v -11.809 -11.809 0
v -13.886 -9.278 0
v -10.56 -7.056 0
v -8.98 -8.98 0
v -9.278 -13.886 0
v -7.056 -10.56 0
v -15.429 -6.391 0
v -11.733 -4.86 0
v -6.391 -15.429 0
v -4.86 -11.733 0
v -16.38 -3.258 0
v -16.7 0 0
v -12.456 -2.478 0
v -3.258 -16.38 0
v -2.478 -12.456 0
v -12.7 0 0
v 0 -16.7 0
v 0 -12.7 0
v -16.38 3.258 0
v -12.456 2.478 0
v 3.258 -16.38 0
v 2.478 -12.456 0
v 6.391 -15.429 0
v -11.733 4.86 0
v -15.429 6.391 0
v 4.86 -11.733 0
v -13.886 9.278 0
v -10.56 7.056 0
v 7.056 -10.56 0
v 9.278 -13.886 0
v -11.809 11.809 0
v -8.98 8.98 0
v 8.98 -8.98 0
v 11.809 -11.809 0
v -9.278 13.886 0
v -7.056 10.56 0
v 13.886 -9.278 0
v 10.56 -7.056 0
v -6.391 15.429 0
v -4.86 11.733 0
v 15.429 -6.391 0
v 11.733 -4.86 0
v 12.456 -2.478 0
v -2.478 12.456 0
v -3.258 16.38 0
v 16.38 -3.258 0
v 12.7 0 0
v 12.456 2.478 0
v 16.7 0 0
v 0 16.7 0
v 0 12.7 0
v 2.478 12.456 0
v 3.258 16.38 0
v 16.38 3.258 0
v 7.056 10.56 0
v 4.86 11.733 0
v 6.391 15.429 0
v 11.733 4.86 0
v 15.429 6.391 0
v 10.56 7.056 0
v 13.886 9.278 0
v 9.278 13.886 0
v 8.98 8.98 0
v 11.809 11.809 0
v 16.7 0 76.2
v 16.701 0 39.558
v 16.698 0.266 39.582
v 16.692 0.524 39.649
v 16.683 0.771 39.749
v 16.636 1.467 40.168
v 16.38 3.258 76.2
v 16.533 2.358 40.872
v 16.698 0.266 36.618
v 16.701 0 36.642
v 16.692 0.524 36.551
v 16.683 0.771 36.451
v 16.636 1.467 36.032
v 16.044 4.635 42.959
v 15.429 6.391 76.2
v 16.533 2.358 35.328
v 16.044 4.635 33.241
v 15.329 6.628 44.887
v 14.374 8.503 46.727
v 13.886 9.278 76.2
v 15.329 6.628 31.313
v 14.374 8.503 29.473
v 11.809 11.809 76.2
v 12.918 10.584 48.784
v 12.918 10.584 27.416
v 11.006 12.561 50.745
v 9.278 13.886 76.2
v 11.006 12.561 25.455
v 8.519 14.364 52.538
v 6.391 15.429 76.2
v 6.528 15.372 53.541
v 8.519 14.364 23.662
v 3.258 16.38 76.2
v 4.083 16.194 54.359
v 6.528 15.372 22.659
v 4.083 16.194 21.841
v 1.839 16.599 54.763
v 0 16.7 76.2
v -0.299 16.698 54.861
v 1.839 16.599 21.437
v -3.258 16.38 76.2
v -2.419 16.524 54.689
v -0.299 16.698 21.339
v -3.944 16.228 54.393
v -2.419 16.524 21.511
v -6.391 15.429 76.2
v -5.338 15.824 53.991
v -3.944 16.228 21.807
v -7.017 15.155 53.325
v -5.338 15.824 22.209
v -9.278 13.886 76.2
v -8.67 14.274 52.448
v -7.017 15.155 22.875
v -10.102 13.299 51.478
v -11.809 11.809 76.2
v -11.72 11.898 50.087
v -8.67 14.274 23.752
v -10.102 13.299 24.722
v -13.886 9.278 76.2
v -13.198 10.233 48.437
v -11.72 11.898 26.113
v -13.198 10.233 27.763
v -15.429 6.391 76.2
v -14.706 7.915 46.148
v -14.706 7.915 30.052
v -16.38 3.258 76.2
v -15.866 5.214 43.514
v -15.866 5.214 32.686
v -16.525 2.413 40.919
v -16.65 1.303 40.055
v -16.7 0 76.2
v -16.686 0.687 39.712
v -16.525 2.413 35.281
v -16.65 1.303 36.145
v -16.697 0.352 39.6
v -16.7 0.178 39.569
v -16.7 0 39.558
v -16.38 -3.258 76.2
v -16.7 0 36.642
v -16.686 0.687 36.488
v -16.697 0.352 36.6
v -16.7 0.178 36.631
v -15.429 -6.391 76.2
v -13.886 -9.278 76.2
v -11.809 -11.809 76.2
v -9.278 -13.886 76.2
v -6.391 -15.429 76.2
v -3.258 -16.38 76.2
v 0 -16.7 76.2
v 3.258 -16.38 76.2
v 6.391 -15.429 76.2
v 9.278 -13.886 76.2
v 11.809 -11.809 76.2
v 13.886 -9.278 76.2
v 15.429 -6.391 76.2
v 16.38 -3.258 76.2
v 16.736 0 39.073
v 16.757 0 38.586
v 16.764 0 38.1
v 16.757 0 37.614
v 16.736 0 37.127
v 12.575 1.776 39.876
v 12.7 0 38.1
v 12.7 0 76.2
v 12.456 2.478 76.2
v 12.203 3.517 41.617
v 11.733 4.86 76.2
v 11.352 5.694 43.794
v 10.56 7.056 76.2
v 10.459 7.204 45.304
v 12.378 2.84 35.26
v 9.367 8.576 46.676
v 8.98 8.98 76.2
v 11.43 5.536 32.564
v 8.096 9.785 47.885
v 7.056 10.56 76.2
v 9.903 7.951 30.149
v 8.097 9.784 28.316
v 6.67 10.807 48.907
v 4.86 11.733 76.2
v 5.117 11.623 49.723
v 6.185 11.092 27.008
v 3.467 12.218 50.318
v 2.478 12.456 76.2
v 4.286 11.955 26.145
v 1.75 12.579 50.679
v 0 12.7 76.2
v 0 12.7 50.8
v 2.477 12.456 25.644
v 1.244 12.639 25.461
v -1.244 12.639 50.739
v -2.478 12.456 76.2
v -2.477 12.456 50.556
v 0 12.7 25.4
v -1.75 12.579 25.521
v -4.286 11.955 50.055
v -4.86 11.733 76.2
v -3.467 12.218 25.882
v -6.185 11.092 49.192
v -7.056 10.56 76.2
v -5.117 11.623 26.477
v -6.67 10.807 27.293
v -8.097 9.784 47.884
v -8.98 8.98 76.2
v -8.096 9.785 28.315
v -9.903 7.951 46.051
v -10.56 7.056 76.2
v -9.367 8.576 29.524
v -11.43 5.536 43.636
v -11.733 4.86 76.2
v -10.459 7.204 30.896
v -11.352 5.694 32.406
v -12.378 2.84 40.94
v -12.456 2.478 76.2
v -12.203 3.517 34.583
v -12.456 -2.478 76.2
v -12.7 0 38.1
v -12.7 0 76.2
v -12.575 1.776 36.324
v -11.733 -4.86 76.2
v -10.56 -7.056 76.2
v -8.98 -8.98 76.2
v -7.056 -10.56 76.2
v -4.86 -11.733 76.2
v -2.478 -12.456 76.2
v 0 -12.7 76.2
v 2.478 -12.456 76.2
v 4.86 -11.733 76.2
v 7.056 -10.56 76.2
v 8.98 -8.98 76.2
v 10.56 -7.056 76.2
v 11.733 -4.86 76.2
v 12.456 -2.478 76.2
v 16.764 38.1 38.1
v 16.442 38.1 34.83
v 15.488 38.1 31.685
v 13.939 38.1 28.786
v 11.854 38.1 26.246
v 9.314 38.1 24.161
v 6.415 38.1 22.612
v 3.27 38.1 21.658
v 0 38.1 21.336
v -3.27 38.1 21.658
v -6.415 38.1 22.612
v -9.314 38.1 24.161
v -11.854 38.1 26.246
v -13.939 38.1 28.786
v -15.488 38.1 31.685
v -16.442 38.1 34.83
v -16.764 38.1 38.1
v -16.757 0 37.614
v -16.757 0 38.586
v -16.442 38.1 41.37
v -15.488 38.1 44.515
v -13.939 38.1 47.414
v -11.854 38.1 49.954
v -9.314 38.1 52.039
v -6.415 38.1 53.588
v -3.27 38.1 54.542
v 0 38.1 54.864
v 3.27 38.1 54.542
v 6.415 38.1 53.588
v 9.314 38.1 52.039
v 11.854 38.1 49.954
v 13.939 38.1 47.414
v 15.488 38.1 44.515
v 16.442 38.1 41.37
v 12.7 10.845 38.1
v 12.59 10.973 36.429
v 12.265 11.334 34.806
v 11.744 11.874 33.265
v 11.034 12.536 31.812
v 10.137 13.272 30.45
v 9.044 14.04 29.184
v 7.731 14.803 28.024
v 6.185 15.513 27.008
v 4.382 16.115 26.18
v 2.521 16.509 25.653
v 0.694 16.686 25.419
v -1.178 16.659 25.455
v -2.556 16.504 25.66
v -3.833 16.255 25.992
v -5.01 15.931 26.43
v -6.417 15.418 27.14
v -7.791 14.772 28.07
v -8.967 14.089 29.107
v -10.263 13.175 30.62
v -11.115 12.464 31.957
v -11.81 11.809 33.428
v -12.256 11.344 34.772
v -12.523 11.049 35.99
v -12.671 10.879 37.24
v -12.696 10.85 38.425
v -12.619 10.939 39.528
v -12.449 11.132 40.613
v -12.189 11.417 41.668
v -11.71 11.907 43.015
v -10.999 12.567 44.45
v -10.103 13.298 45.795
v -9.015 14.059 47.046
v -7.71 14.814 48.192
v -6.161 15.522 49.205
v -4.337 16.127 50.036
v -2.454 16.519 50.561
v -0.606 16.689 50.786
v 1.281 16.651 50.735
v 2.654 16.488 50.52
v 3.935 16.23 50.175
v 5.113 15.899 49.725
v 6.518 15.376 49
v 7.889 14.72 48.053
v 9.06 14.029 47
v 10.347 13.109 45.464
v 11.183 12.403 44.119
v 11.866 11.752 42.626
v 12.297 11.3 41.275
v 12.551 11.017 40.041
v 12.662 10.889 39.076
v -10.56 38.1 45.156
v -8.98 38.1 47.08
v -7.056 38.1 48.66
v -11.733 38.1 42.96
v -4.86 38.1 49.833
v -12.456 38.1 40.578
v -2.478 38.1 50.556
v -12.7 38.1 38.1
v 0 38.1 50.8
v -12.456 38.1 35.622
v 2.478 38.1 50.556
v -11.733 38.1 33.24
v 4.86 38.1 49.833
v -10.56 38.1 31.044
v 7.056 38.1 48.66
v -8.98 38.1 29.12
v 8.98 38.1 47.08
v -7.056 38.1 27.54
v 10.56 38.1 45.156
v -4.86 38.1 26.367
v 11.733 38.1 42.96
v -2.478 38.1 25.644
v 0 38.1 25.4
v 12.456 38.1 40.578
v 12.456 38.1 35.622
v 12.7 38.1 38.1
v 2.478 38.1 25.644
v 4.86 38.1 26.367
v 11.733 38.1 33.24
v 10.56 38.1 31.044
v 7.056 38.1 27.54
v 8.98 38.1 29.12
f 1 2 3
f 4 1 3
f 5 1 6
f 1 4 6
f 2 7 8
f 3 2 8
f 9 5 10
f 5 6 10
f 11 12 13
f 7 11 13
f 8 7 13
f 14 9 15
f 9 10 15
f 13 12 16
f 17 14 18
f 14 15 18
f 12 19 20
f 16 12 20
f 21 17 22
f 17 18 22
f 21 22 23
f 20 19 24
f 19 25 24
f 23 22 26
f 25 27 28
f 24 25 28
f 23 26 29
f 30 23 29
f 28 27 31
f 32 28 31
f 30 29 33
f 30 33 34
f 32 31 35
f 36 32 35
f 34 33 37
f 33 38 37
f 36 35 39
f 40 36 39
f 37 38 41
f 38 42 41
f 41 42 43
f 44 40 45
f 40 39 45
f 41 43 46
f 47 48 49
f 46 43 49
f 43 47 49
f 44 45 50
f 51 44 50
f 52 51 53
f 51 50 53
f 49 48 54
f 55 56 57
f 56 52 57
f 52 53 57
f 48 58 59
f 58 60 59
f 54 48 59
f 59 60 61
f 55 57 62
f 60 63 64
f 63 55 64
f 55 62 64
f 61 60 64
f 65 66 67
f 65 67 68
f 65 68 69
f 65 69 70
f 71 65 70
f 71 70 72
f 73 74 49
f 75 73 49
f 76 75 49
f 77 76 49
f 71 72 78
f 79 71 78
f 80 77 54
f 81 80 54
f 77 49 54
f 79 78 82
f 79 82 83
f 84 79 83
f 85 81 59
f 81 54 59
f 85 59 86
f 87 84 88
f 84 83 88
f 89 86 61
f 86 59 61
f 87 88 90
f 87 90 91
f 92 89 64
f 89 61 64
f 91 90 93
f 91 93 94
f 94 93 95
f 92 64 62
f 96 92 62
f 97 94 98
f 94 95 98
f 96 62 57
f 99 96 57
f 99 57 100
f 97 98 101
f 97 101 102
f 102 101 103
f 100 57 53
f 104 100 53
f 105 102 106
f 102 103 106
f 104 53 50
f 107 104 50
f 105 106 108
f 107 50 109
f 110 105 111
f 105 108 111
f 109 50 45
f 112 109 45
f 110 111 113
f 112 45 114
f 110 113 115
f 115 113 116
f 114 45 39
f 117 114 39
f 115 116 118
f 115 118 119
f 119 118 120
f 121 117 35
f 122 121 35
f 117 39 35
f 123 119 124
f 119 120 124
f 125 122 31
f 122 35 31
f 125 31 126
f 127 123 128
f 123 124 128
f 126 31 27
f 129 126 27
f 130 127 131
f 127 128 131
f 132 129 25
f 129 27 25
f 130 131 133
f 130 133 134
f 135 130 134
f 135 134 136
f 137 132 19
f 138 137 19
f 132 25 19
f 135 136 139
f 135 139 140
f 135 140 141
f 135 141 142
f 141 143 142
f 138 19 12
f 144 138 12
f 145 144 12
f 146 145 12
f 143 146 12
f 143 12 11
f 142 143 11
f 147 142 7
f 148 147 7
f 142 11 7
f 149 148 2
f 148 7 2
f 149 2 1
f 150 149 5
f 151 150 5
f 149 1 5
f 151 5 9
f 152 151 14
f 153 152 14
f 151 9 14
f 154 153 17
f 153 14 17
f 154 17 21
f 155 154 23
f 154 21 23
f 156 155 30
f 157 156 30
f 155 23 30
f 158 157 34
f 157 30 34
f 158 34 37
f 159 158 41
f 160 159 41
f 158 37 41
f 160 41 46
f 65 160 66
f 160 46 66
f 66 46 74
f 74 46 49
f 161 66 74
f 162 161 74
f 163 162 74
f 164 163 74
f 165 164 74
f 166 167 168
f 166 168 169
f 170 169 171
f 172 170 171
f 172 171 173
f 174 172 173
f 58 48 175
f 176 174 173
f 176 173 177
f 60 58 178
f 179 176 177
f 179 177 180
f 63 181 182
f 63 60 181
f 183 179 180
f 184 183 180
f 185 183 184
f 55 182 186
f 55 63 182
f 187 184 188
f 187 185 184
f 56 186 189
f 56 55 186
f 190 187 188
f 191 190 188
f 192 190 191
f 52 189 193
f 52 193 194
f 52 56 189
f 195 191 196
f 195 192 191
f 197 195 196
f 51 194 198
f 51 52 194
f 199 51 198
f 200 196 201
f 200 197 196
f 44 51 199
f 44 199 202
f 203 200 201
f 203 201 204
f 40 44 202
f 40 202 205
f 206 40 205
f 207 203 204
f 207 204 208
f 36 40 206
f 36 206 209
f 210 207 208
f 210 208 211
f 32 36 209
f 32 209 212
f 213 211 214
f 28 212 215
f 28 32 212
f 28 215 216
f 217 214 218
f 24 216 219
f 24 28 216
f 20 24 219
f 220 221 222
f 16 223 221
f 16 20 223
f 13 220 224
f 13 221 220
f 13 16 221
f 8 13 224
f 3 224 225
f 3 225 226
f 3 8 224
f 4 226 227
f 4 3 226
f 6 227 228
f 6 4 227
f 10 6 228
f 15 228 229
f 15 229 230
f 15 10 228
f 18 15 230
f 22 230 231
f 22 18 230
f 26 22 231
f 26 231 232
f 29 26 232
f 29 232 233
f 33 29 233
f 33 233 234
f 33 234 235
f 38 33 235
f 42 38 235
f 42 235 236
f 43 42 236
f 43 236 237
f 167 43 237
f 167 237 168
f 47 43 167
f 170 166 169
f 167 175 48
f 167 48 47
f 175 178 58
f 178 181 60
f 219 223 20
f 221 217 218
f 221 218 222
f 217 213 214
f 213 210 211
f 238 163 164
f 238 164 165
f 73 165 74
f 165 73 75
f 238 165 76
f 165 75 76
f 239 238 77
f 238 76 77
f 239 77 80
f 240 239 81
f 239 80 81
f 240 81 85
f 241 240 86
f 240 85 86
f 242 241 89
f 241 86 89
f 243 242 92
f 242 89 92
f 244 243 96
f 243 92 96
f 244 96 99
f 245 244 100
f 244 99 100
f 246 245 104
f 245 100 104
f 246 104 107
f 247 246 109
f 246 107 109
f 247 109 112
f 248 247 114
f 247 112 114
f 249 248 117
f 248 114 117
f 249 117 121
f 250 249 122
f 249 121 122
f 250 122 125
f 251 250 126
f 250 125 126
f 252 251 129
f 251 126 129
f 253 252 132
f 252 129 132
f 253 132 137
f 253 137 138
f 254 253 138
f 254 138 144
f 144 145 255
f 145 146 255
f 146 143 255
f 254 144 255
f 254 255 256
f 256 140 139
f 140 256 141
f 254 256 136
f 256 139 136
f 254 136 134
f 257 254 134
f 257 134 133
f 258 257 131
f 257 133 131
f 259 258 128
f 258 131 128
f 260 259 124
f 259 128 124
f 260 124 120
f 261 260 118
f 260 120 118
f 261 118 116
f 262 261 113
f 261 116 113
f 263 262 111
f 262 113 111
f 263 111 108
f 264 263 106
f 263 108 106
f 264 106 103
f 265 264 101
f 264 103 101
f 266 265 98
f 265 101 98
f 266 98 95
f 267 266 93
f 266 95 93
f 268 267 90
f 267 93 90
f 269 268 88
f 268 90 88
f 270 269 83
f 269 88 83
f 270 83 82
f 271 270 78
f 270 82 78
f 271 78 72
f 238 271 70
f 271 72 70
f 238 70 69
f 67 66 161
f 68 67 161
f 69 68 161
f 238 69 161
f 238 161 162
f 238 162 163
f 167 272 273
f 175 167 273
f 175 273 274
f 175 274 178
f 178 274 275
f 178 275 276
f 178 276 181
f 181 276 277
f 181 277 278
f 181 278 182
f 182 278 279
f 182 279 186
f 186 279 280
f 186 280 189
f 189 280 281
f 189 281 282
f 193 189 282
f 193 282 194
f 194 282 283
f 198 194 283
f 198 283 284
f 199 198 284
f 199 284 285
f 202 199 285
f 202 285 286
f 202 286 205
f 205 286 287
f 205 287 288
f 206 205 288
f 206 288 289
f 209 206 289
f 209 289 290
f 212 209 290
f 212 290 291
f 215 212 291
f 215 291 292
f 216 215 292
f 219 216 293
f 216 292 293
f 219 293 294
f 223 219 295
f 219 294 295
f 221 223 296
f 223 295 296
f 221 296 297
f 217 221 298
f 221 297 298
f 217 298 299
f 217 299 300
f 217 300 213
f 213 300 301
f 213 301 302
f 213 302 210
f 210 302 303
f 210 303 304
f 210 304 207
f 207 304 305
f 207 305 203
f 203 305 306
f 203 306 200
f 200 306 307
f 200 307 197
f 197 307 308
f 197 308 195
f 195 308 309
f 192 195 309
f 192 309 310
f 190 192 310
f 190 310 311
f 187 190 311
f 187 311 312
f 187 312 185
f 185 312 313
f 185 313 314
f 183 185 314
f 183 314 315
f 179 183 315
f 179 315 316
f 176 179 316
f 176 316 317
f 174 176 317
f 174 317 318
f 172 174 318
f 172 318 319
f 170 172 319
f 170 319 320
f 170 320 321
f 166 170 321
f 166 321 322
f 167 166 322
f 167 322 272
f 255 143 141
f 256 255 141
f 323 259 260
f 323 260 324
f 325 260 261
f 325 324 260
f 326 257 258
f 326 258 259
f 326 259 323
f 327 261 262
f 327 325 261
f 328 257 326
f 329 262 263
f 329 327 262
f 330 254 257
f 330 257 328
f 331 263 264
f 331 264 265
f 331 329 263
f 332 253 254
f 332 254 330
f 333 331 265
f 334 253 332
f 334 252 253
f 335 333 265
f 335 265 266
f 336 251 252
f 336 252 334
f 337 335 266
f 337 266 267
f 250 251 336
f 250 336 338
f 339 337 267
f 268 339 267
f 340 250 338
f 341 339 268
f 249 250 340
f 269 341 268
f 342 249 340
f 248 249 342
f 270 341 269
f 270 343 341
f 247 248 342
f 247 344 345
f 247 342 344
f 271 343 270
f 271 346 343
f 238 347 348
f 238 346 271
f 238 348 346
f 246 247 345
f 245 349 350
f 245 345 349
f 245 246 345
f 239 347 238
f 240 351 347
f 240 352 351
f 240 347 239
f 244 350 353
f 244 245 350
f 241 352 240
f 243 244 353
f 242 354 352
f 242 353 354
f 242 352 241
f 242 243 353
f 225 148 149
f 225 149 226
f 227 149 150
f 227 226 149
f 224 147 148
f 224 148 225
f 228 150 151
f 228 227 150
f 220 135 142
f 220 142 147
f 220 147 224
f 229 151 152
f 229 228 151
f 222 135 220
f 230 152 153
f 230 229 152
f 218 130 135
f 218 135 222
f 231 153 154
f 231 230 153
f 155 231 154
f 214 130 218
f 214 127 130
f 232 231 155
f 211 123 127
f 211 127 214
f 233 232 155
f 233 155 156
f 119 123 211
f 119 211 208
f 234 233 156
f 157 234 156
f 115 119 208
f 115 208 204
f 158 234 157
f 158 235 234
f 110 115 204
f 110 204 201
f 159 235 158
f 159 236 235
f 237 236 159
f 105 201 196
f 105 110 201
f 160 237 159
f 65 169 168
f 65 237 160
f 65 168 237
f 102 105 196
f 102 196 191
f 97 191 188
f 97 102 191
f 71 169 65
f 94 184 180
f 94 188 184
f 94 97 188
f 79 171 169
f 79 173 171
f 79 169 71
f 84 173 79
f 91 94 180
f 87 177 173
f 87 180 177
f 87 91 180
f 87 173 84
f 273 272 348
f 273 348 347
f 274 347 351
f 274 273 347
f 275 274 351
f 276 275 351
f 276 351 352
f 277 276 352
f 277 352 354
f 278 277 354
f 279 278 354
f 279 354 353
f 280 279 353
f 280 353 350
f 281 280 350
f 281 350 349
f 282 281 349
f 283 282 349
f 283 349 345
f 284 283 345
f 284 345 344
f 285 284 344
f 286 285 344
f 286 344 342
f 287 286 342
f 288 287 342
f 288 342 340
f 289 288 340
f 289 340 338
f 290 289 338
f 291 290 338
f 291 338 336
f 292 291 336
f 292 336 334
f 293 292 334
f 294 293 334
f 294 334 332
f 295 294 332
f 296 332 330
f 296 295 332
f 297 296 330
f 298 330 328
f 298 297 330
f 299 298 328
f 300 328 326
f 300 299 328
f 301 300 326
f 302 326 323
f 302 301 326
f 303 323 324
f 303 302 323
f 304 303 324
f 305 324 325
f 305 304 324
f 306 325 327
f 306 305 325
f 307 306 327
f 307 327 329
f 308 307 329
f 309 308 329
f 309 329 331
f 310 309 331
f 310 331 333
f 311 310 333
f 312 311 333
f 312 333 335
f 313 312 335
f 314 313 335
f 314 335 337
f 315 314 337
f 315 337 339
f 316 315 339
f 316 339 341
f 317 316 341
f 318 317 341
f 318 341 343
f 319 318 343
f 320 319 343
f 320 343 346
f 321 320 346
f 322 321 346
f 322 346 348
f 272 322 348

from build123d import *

# Parameters (mm, degrees)
SKETCH1_R           = 16.7005
SKETCH1_R_2         = 12.7
BOSS_EXTRUDE1_DEPTH = 76.2
SKETCH2_R           = 16.764
SKETCH2_R_2         = 12.7
BOSS_EXTRUDE2_DEPTH = 38.1
SKETCH4_R           = 12.7
CUT_EXTRUDE2_DEPTH  = 77.2000001
CUT_EXTRUDE3_REACH  = 56.801
SKETCH5_R           = 12.7


with BuildPart() as part:
    # Sketch1 → Boss-Extrude1 (new body)
    with BuildSketch(Plane.XY):
        Circle(SKETCH1_R)
        Circle(SKETCH1_R_2, mode=Mode.SUBTRACT)
    extrude(amount=BOSS_EXTRUDE1_DEPTH)

    # Sketch2 → Boss-Extrude2 (add)
    with BuildSketch(Plane(origin=(0, 0, 0), x_dir=(1, 0, 0), z_dir=(0, 1, 0))):
        with Locations((0, -38.1)):
            Circle(SKETCH2_R)
        with Locations((0, -38.1)):
            Circle(SKETCH2_R_2, mode=Mode.SUBTRACT)
    extrude(amount=BOSS_EXTRUDE2_DEPTH)

    # Sketch4 → Cut-Extrude2 (cut, through all)
    with BuildSketch(Plane.XY.offset(76.2)):
        Circle(SKETCH4_R)
    extrude(amount=-CUT_EXTRUDE2_DEPTH, mode=Mode.SUBTRACT)

    # Sketch5 → Cut-Extrude3 (cut, up to next)
    with BuildSketch(Plane(origin=(0, 38.1, 0), x_dir=(1, 0, 0), z_dir=(0, 1, 0)), mode=Mode.PRIVATE) as cut_extrude3_sk1:
        with Locations((0, -38.1)):
            Circle(SKETCH5_R)
    cut_extrude3_tool1 = extrude(cut_extrude3_sk1.sketch, amount=-CUT_EXTRUDE3_REACH, mode=Mode.PRIVATE) & part.part
    add(cut_extrude3_tool1.solids().sort_by_distance((0, 38.1, 38.1))[0], mode=Mode.SUBTRACT)


solid = part.part
